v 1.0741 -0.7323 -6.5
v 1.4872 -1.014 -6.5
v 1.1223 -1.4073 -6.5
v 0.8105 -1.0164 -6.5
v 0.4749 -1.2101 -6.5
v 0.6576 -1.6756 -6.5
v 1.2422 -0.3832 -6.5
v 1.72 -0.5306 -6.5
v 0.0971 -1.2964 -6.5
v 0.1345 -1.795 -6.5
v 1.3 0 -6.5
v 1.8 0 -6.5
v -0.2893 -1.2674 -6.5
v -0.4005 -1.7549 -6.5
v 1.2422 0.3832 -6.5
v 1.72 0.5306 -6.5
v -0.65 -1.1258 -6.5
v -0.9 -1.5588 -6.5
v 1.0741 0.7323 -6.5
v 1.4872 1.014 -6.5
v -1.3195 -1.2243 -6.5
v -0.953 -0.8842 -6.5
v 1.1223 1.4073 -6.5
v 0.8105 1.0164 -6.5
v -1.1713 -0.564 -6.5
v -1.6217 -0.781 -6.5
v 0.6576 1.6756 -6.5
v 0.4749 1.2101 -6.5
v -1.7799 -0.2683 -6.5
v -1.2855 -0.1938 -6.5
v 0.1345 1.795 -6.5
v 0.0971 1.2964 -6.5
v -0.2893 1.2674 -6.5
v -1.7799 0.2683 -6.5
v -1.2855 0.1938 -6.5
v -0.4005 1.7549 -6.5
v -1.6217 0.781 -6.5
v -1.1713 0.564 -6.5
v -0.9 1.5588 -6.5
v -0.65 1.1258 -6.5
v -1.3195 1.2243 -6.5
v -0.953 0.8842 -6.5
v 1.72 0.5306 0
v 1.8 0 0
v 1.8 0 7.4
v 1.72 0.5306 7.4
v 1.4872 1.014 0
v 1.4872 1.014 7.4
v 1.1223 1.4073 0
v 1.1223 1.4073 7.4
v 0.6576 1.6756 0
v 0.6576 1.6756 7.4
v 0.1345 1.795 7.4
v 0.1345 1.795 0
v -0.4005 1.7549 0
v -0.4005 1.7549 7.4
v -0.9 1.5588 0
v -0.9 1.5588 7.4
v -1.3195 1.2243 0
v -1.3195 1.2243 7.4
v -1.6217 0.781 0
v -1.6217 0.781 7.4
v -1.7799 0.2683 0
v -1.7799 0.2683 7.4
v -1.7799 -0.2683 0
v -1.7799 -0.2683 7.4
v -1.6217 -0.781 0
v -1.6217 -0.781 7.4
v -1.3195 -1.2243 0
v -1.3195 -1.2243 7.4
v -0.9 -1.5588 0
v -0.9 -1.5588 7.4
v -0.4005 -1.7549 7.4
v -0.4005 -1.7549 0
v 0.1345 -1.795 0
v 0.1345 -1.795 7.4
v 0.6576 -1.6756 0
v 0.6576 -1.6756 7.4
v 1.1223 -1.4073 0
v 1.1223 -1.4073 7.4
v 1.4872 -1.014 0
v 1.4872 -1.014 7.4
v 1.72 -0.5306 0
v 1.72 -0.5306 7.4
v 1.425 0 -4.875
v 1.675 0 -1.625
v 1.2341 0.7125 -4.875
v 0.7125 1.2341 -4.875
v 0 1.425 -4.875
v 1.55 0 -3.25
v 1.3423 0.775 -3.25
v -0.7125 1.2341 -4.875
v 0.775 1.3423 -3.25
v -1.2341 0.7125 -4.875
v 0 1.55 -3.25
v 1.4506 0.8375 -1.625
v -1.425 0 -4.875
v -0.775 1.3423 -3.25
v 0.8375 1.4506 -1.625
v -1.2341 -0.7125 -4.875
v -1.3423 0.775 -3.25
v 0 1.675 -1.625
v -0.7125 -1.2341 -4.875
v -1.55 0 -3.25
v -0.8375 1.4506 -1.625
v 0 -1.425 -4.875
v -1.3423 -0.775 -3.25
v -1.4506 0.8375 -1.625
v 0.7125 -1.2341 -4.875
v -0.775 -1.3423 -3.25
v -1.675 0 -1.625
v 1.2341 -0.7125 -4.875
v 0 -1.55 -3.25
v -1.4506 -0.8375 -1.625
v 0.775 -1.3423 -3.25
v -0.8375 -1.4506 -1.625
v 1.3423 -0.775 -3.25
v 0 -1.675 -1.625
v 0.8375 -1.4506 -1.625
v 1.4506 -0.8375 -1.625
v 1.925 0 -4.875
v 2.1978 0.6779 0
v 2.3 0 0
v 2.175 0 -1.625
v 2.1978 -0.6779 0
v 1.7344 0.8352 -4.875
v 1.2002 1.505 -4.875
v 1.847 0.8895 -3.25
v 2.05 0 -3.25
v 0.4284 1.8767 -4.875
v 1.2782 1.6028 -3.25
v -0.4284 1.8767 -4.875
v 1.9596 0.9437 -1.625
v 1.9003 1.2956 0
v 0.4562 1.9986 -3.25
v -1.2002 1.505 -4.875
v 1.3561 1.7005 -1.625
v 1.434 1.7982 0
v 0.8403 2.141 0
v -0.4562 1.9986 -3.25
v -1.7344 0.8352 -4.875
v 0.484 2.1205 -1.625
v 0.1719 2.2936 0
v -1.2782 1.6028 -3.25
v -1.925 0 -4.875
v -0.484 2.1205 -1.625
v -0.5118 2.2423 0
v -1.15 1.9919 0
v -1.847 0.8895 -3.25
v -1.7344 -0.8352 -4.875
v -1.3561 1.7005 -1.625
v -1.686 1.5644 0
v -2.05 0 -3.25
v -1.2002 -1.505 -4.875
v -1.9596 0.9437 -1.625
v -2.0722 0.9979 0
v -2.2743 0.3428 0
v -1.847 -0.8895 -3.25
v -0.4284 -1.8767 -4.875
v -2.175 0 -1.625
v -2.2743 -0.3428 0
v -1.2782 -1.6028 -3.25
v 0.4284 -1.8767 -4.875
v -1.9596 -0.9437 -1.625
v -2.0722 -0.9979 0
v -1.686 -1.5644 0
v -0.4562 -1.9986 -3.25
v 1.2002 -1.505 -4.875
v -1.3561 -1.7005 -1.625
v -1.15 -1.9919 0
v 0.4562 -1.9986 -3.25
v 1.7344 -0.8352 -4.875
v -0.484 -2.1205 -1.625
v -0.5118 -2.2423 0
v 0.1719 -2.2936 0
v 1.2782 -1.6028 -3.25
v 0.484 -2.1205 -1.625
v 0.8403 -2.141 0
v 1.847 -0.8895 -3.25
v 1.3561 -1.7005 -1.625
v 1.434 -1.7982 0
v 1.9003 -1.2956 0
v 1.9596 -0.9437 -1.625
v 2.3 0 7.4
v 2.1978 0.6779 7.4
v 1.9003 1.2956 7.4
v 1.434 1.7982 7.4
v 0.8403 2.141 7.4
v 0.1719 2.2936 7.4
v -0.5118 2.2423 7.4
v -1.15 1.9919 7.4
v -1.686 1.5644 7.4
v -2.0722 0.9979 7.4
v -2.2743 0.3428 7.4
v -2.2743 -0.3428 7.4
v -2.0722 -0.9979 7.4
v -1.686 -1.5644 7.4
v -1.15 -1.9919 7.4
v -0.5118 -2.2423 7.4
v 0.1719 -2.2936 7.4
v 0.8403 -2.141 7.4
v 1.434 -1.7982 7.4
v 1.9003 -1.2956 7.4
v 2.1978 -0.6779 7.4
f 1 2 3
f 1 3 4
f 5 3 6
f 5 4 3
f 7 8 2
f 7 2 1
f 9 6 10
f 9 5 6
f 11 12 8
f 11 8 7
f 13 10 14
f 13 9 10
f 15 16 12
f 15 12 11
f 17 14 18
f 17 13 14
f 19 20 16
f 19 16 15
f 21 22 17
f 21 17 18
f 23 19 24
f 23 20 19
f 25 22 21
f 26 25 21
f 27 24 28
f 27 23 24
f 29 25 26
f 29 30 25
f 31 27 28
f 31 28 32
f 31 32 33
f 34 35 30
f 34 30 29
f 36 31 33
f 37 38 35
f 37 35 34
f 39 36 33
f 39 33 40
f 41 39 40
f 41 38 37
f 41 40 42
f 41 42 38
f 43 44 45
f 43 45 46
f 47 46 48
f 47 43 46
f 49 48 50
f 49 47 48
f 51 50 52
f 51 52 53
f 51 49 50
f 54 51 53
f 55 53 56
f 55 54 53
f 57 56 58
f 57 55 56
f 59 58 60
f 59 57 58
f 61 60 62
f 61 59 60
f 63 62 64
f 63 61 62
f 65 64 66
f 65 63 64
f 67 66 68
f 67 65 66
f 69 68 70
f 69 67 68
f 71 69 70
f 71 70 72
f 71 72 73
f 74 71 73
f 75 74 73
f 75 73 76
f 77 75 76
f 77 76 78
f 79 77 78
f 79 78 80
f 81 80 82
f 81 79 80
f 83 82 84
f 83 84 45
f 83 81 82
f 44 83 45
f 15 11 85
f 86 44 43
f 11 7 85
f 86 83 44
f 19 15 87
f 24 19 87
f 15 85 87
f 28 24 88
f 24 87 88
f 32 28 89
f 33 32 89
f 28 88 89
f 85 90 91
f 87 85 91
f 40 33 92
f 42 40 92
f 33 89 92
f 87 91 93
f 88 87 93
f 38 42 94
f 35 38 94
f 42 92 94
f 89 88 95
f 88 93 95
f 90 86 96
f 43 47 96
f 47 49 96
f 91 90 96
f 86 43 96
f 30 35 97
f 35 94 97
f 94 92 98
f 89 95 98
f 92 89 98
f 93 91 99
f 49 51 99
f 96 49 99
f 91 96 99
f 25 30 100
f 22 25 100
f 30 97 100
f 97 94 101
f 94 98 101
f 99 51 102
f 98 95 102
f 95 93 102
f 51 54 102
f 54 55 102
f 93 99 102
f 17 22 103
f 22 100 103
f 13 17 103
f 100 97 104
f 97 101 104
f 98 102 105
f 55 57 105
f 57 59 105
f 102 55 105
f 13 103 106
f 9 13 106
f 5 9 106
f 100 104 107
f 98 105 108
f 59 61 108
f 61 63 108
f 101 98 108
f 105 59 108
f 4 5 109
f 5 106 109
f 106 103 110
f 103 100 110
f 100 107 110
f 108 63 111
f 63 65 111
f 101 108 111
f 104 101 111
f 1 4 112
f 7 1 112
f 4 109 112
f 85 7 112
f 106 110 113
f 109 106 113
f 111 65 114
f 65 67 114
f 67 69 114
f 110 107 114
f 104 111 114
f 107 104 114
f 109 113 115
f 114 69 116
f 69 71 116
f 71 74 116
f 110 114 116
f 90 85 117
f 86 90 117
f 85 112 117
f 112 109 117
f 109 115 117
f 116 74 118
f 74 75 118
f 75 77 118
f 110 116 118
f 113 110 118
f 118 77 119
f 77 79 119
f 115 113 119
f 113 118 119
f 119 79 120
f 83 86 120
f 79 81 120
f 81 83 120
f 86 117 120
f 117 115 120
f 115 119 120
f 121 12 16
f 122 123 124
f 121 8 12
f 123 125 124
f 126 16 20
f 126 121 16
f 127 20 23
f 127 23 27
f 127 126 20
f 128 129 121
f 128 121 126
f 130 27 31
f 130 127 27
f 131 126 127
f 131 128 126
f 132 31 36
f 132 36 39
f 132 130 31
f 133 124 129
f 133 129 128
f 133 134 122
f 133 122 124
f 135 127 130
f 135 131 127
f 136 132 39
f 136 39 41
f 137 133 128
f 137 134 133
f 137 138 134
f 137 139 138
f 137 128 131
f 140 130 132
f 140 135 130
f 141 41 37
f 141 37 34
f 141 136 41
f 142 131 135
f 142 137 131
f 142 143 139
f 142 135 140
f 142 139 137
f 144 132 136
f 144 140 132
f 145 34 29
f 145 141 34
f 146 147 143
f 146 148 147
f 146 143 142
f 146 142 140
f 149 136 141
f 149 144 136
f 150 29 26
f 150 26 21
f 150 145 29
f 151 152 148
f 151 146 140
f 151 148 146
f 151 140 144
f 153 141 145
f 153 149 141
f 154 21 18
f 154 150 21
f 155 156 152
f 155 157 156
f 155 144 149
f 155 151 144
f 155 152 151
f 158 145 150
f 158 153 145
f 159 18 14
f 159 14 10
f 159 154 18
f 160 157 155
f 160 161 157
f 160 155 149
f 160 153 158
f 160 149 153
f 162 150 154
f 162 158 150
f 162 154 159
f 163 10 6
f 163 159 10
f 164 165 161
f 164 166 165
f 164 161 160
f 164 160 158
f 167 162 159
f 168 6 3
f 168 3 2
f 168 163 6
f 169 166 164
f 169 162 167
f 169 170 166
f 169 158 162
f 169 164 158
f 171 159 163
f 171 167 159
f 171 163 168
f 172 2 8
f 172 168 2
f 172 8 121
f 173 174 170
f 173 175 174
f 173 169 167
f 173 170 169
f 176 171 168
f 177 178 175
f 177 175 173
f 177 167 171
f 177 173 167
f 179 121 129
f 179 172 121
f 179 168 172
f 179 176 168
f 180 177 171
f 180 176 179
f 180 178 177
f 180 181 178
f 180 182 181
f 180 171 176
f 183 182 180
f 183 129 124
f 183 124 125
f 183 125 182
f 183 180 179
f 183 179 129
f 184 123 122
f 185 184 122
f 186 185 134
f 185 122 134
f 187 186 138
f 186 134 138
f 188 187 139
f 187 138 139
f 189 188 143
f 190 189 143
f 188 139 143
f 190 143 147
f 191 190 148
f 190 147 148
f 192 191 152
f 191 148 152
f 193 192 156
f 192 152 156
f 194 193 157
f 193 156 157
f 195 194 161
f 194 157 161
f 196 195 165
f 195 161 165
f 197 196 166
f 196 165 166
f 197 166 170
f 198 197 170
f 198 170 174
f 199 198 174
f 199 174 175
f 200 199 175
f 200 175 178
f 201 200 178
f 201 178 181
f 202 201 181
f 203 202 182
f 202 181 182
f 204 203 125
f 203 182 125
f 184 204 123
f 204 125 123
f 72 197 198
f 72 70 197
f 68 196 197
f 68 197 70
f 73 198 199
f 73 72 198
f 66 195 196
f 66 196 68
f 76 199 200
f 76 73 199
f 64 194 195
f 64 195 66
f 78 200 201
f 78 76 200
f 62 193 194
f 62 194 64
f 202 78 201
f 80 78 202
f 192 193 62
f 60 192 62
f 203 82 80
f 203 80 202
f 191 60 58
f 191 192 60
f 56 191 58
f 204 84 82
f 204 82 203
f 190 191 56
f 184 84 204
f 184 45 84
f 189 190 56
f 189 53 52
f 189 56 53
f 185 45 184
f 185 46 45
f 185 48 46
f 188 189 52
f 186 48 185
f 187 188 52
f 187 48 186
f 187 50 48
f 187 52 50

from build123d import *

# Parameters (mm, degrees)
CYLINDER001_R     = 1.8
CYLINDER001_DEPTH = 7.4
CYLINDER_R        = 2.3
CYLINDER_DEPTH    = 7.4


with BuildPart() as cone001:
    # Cone001 → Cone001 (revolve)
    with BuildSketch(Plane(origin=(0, 0, -6.5), x_dir=(1, 0, 0), z_dir=(0, -1, 0))):
        Polygon((0, 0), (1.3, 0), (1.8, 6.5), (0, 6.5), align=None)
    revolve(axis=Axis((0, 0, -6.5), (0, 0, 1)))


with BuildPart() as inner_fusion:
    # Cylinder001 → Cylinder001 (new body)
    with BuildSketch(Plane.XY):
        Circle(CYLINDER001_R)
    extrude(amount=CYLINDER001_DEPTH)

    # Fusion001: union Cone001
    add(cone001.part)


with BuildPart() as cone:
    # Cone → Cone (revolve)
    with BuildSketch(Plane(origin=(0, 0, -6.5), x_dir=(1, 0, 0), z_dir=(0, -1, 0))):
        Polygon((0, 0), (1.8, 0), (2.3, 6.5), (0, 6.5), align=None)
    revolve(axis=Axis((0, 0, -6.5), (0, 0, 1)))


with BuildPart() as vtulka_cut:
    # Cylinder → Cylinder (new body)
    with BuildSketch(Plane.XY):
        Circle(CYLINDER_R)
    extrude(amount=CYLINDER_DEPTH)

    # Fusion: union Cone
    add(cone.part)

    # Cut: cut inner fusion
    add(inner_fusion.part, mode=Mode.SUBTRACT)


solid = vtulka_cut.part
